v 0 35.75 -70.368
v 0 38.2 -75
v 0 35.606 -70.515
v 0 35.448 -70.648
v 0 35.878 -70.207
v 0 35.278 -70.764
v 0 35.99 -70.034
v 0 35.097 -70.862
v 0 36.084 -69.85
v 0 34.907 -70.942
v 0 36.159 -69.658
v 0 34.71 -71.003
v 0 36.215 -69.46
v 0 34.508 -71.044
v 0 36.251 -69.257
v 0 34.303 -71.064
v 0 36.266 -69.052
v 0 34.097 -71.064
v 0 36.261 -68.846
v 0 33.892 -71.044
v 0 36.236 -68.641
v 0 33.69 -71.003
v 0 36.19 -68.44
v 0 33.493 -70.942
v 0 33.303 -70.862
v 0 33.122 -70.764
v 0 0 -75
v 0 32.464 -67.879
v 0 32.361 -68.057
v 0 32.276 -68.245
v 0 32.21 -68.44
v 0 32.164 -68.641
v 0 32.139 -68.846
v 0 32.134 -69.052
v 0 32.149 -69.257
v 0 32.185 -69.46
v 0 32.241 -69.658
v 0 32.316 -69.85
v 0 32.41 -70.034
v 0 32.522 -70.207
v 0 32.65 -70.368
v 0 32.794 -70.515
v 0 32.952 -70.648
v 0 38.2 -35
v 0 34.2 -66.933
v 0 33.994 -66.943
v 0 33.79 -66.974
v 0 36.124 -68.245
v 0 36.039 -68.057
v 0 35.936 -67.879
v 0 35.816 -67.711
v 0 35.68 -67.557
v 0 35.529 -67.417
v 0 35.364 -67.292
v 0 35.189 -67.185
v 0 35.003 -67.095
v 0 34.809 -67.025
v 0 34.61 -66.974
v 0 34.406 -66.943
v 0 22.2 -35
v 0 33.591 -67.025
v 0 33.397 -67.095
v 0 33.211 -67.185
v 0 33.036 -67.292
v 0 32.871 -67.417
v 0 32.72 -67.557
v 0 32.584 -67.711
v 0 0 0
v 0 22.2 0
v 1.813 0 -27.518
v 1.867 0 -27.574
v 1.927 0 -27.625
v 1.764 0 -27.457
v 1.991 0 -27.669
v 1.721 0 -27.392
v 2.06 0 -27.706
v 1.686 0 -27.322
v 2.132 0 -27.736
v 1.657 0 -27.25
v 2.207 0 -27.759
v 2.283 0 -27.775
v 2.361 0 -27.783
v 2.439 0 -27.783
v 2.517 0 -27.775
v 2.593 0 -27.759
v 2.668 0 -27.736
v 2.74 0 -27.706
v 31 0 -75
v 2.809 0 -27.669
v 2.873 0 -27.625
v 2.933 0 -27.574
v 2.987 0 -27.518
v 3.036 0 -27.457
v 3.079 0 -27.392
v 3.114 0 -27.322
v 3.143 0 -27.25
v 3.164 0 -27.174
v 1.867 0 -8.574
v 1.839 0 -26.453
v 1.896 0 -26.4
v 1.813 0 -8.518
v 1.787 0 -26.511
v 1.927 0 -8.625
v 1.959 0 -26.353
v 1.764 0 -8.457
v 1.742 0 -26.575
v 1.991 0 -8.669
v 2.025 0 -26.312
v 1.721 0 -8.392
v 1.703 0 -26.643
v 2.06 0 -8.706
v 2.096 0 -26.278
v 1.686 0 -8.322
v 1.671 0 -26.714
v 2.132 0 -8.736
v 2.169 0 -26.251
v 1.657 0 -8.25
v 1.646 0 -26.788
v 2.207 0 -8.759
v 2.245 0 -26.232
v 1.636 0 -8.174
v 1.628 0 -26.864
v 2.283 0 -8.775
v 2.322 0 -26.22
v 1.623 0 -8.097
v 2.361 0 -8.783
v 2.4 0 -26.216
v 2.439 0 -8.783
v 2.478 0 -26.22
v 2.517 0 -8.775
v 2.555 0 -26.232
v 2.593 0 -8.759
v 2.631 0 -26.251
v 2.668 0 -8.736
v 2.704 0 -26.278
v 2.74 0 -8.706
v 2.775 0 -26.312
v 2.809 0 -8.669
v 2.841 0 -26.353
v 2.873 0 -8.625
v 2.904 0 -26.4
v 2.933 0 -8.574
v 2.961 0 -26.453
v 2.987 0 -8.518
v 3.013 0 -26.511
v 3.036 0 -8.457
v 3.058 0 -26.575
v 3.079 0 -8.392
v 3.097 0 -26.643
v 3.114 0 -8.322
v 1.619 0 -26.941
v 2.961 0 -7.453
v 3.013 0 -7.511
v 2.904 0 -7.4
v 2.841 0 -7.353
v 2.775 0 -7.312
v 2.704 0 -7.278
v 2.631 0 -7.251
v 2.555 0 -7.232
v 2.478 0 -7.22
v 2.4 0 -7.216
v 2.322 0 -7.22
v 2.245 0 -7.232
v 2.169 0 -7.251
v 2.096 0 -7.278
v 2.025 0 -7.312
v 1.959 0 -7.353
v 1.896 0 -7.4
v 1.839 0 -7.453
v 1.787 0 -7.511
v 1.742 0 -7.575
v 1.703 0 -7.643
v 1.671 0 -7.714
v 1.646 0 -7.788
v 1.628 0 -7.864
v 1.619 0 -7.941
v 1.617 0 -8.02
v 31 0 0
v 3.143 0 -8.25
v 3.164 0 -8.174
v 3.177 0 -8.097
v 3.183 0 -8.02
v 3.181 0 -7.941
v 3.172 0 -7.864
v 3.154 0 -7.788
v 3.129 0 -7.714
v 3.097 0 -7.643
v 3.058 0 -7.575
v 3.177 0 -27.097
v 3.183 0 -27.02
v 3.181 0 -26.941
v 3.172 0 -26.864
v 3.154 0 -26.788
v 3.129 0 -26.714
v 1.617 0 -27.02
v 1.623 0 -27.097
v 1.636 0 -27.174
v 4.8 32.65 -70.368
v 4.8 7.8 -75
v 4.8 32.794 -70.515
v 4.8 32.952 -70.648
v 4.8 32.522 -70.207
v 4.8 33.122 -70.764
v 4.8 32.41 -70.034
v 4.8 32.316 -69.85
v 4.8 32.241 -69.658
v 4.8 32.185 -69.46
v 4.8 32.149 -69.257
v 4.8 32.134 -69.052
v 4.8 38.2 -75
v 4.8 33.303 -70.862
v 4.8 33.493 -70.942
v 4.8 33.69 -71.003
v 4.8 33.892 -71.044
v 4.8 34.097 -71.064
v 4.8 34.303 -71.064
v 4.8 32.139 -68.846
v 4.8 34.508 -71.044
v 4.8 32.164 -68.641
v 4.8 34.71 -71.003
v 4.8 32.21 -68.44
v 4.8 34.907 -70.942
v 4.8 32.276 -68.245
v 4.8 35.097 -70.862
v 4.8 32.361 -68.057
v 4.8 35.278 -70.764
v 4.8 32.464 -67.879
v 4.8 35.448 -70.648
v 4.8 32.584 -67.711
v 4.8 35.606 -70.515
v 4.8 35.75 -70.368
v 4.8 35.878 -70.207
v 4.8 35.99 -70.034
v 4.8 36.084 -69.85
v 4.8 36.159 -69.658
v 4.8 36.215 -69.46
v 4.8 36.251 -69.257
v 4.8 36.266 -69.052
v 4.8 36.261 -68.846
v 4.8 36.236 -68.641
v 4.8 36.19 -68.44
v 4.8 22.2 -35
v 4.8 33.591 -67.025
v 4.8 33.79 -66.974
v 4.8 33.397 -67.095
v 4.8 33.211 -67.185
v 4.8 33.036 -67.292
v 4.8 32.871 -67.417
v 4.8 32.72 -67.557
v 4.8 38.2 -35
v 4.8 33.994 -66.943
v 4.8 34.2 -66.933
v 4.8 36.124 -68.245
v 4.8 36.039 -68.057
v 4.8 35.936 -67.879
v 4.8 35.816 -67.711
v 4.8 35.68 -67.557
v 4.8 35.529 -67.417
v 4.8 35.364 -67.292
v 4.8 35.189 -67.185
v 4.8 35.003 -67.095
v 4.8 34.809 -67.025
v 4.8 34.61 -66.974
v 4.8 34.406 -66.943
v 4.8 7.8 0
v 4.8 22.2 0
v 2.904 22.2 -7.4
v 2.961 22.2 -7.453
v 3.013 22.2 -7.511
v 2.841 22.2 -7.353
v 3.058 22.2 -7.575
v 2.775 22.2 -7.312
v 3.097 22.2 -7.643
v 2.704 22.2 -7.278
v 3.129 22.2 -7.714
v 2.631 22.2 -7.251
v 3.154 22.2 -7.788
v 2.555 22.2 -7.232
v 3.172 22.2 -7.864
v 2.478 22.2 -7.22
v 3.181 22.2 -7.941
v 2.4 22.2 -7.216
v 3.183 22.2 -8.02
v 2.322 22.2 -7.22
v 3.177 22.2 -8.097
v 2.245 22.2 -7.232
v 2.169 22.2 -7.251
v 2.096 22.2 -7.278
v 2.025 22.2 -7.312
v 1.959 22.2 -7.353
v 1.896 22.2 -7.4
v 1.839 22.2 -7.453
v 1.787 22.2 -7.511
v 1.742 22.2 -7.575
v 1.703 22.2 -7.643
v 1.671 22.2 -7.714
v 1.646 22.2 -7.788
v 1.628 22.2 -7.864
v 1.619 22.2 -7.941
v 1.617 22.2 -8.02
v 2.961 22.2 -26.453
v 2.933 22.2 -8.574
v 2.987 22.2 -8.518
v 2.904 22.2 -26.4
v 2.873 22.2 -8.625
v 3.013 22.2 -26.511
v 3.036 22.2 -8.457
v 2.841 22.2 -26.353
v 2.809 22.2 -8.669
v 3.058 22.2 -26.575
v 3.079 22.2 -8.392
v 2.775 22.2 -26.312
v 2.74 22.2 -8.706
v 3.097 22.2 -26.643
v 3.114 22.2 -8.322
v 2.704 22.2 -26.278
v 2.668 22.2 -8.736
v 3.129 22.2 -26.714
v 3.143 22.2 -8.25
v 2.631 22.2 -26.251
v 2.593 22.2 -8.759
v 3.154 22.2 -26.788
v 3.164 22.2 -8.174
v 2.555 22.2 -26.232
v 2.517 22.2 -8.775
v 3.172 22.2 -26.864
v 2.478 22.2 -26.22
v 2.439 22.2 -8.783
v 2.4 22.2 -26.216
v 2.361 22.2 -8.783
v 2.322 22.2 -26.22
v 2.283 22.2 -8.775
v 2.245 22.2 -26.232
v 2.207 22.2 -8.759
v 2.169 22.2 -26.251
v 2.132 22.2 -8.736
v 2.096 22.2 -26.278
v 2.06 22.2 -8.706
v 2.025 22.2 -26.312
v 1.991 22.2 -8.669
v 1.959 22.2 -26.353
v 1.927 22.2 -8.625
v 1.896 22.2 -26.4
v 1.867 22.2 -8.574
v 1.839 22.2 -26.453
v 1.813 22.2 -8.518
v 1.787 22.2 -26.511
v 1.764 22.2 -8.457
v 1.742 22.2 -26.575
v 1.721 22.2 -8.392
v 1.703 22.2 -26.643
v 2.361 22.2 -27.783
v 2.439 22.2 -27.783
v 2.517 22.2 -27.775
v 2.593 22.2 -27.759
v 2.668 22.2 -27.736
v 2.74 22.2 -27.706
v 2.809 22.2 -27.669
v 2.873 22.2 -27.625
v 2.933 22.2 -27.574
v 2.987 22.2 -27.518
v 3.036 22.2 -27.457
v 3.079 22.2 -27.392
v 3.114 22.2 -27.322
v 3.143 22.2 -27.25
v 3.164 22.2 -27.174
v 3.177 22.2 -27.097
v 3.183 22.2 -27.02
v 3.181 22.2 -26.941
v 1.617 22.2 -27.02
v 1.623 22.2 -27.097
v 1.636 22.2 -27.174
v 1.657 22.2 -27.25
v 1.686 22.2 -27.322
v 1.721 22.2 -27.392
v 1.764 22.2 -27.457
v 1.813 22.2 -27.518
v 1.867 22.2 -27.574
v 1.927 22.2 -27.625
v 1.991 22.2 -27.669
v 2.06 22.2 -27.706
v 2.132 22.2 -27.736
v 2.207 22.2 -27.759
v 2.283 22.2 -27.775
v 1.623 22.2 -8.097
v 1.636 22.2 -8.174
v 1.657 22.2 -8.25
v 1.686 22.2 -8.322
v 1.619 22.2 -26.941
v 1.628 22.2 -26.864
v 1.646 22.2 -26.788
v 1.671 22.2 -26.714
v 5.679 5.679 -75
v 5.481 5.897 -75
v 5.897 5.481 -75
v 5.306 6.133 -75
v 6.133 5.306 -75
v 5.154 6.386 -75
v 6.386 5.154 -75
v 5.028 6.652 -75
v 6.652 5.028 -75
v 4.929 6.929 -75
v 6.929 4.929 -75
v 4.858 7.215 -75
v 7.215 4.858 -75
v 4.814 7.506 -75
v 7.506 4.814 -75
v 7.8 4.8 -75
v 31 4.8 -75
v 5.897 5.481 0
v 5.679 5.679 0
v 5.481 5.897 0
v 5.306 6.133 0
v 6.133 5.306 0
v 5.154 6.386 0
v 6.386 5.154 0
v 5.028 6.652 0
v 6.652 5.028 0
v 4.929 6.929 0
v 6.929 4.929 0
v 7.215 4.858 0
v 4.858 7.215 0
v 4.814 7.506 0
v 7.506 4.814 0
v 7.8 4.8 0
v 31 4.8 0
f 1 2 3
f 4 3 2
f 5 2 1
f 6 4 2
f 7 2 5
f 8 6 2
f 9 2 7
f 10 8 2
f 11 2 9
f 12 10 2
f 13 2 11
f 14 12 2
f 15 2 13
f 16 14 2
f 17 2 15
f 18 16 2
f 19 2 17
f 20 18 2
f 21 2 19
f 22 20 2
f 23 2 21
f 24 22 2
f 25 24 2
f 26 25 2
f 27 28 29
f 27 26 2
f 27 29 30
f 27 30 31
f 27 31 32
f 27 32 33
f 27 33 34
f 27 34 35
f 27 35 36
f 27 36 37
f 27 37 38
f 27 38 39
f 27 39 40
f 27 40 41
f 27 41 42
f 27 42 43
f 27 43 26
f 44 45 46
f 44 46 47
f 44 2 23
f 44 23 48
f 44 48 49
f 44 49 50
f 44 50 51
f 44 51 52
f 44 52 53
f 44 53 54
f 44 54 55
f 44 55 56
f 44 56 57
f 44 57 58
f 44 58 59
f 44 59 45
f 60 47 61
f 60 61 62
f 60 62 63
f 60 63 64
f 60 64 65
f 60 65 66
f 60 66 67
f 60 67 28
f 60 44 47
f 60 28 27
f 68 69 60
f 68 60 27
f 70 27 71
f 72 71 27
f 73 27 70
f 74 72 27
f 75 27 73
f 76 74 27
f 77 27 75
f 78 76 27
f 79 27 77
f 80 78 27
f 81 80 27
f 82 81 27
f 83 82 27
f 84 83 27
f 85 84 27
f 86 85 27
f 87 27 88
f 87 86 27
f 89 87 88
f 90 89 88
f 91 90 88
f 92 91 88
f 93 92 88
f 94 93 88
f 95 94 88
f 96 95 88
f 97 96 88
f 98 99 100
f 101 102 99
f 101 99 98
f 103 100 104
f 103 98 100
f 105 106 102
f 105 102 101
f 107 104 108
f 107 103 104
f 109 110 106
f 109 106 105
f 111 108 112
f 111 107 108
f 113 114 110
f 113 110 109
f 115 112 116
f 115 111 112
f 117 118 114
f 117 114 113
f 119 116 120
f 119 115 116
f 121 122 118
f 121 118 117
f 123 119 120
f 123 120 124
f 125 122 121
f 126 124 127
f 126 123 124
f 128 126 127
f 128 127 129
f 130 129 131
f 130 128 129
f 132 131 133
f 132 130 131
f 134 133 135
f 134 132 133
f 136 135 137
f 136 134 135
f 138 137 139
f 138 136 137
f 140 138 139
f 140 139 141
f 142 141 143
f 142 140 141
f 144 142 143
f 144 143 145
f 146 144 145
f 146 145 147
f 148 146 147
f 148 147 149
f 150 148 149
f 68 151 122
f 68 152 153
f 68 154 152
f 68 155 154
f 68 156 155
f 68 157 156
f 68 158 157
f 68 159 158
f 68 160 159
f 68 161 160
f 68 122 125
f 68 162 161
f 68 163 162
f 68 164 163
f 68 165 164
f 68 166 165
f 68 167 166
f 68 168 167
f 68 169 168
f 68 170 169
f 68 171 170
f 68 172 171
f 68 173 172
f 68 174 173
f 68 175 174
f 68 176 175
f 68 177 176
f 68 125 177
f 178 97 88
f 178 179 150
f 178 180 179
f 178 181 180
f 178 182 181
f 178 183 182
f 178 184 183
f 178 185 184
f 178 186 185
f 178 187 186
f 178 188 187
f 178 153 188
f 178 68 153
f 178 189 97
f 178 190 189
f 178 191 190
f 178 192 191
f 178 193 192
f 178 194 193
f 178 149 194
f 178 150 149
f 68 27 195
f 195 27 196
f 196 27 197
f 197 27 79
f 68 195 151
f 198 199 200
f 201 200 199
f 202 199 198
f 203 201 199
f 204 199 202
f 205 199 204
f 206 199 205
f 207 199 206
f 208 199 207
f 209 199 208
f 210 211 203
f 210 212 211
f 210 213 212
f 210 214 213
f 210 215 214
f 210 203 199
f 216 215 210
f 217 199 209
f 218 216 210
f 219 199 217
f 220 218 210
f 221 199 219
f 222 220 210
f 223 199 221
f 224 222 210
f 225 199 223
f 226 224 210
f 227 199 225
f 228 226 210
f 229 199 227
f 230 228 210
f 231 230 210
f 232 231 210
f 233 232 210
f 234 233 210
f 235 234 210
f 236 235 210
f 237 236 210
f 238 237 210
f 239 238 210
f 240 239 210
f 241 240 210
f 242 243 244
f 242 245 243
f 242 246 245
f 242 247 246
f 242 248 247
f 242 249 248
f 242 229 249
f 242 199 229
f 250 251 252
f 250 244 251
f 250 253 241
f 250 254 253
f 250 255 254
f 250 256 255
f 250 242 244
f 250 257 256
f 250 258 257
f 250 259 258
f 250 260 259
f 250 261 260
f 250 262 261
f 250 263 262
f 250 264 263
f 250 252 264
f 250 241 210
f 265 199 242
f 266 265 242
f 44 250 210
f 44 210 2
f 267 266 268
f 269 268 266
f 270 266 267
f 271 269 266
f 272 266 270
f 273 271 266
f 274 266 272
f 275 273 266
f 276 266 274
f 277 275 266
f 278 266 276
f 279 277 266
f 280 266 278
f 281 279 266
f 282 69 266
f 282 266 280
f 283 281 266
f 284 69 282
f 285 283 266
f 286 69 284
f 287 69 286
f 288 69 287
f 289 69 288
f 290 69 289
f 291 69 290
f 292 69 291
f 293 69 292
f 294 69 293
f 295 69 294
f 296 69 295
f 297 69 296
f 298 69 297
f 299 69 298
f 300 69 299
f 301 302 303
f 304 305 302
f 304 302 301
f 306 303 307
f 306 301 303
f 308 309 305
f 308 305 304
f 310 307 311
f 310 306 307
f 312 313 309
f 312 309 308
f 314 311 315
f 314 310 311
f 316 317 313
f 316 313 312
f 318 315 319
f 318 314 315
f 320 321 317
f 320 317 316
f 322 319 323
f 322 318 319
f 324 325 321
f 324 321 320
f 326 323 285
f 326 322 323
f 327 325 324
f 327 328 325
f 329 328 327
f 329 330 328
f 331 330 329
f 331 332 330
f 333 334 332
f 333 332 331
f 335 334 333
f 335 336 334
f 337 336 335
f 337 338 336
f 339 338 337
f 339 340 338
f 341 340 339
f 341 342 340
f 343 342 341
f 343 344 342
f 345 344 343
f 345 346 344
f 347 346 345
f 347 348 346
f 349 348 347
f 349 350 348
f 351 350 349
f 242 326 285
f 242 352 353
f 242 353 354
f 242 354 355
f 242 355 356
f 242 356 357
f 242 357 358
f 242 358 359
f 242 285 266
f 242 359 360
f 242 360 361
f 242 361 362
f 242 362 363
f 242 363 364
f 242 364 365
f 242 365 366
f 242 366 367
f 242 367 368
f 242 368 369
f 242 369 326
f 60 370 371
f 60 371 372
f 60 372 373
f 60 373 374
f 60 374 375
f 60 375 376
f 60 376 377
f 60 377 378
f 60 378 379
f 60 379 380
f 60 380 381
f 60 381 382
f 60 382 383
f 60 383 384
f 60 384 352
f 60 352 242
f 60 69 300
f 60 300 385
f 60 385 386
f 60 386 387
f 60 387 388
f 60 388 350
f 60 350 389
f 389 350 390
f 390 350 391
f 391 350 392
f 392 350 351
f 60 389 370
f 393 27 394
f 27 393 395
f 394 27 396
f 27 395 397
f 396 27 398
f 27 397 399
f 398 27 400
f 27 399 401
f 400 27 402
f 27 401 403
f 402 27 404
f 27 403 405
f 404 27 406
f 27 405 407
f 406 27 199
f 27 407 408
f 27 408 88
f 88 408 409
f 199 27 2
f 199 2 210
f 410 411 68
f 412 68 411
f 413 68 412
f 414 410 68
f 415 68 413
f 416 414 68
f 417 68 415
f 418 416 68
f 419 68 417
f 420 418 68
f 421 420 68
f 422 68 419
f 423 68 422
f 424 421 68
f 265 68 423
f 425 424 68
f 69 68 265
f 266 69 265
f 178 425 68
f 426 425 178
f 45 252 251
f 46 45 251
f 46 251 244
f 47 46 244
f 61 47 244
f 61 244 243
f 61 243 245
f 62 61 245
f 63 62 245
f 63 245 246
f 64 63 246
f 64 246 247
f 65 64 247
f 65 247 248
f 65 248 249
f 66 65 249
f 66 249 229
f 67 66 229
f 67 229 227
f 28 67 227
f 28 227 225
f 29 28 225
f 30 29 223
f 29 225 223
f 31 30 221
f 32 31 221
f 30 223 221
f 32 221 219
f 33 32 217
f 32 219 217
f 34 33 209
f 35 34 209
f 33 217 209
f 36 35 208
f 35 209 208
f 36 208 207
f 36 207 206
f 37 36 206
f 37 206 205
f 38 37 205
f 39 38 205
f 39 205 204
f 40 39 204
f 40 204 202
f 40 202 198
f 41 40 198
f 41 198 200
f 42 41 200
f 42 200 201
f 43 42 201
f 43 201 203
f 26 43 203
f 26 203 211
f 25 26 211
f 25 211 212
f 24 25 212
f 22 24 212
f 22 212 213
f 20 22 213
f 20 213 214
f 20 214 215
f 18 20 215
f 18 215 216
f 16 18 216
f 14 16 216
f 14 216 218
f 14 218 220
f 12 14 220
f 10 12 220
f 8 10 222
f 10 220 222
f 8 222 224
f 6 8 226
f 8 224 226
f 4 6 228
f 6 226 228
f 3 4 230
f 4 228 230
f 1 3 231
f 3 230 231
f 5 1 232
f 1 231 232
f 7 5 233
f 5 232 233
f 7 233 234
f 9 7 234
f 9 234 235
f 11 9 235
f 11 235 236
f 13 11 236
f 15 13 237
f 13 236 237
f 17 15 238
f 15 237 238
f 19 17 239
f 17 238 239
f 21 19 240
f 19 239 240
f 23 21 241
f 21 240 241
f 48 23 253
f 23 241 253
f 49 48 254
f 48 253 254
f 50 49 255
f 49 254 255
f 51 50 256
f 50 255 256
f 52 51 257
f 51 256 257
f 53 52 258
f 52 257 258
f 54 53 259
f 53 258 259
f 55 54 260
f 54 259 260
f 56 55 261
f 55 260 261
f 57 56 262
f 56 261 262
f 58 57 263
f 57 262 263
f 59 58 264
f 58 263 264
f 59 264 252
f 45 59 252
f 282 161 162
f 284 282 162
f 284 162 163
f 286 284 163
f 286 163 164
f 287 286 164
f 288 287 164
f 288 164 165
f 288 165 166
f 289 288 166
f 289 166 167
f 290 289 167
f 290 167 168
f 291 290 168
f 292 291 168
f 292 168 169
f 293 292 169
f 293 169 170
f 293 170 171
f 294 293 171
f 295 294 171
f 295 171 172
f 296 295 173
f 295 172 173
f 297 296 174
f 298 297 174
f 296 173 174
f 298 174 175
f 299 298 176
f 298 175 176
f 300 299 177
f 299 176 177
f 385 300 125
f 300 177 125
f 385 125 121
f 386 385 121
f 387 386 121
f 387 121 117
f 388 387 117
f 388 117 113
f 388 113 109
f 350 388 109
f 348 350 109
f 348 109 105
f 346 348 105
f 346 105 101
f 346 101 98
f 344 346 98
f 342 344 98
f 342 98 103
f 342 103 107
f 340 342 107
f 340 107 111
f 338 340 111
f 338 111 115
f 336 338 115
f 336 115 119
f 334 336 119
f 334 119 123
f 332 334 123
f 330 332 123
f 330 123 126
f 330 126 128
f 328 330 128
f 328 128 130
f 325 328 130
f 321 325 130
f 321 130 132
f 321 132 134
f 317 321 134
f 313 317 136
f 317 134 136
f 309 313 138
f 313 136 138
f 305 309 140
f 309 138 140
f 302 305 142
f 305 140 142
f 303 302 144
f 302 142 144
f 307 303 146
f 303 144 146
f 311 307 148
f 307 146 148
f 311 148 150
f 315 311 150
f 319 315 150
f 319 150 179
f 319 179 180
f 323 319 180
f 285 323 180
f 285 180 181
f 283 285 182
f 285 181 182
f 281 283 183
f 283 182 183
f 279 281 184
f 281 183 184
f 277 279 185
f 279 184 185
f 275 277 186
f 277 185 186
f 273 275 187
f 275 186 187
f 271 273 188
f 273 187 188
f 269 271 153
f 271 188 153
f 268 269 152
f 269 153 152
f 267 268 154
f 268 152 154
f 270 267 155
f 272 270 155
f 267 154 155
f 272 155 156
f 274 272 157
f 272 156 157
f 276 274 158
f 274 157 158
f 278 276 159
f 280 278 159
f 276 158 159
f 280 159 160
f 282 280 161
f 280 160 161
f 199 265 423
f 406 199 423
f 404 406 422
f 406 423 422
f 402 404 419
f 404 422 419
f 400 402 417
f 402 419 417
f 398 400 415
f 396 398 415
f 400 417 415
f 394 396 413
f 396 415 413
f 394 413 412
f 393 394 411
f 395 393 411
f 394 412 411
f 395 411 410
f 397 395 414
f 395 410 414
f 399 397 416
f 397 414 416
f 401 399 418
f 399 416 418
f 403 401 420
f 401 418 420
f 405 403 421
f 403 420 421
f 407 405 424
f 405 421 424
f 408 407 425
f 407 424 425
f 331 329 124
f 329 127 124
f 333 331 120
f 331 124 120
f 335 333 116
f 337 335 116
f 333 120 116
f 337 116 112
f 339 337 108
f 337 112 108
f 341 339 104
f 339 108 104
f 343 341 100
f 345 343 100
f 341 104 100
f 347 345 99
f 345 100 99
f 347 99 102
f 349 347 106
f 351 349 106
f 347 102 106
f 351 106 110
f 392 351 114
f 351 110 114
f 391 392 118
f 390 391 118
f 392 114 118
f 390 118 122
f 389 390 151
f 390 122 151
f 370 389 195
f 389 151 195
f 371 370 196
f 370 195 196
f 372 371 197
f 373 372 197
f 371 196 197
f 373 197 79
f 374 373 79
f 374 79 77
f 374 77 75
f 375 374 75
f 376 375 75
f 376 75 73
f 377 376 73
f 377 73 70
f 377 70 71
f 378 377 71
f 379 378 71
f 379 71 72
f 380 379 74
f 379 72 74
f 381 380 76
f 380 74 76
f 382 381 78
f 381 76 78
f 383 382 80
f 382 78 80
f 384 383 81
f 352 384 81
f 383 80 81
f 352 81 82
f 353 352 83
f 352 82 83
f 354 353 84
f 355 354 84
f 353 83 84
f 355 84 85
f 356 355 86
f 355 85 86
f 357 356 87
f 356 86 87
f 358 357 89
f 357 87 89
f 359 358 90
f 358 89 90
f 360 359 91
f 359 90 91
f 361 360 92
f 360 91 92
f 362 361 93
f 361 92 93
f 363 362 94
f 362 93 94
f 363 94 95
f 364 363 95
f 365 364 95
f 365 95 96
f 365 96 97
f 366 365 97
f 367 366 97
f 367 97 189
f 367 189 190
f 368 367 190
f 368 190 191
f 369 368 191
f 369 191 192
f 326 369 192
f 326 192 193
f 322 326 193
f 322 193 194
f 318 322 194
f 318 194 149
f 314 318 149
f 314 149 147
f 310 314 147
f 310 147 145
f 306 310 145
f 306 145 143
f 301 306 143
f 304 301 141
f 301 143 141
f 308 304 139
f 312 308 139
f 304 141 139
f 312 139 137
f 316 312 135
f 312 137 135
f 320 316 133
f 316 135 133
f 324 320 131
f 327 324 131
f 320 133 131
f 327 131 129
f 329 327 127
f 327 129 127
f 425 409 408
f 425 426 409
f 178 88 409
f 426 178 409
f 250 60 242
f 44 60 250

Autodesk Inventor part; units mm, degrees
ref_plane "YZ Plane" through (0, 0, 0) normal (1, 0, 0) x (0, 1, 0)
ref_plane "XZ Plane" through (0, 0, 0) normal (0, 1, 0) x (-1, 0, 0)
ref_plane "XY Plane" through (0, 0, 0) normal (0, 0, 1) x (1, 0, 0)
sketch "Sketch1" plane through (0, 0, 0) normal (0, 0, 1) x (1, 0, 0)
  line L0 (0, 38.2) -> (0, 0)
  line L1 (0, 0) -> (31, 0)
  line L2 (31, 0) -> (31, 4.8)
  line L3 (31, 4.8) -> (7.8, 4.8)
  line L4 (4.8, 7.8) -> (4.8, 38.2)
  line L5 (4.8, 38.2) -> (0, 38.2)
  arc A0 (4.8, 7.8) -> (7.8, 4.8) centre (7.8, 7.8) ccw
  dimension "d0" = 31
  dimension "d1" = 38.2
  dimension "d2" = 4.8
  dimension "d3" = 4.8
  dimension "d4" = 3
extrude "Extrusion1" add sketch "Sketch1" against normal blind 75
sketch "Sketch2" plane through (0, 0, 0) normal (-1, 0, 0) x (0, 0, 1)
  line L0 (0, 38.2) -> (-75, 38.2) projected
  line L1 (-75, 0) -> (-75, 38.2) projected
  point P0 (-69, 34.2)
  dimension "d7" = 4
  dimension "d8" = 6
hole "Hole1" at (0, 34.2, -69) direction (1, 0, 0) diameter 4.134 end through all thread size "M5x0.8" class "6H" standard "ANSI Metric M Profile"
sketch "Sketch3" plane through (0, 0, 0) normal (-1, 0, 0) x (0, 0, 1)
  line L0 (0, 38.2) -> (-75, 38.2) projected
  line L1 (-75, 0) -> (-75, 38.2) projected
  line L2 (-35, 48.1735) -> (15.719, 48.1735)
  line L3 (15.719, 48.1735) -> (15.719, 22.2)
  line L4 (15.719, 22.2) -> (-35, 22.2)
  line L5 (-35, 22.2) -> (-35, 48.1735)
  dimension "d16" = 40
  dimension "d17" = 16
extrude "Extrusion2" cut sketch "Sketch3" against normal through all
sketch "Sketch4" plane through (0, 22.2, 0) normal (0, 1, 0) x (1, 0, 0)
  line L0 (4.8, 0) -> (0, 0) projected
  line L1 (0, 35) -> (4.8, 35) projected
  point P0 (2.4, 27)
  point P1 (2.4, 8)
  dimension "d20" = 8
  dimension "d21" = 8
hole "Hole2" at (2.4, 22.2, -27) at (2.4, 22.2, -8) direction (0, -1, 0) diameter 1.567 end through all thread size "M2x0.4" class "6H" standard "ISO Metric profile"
properties part number "Right Angle"
